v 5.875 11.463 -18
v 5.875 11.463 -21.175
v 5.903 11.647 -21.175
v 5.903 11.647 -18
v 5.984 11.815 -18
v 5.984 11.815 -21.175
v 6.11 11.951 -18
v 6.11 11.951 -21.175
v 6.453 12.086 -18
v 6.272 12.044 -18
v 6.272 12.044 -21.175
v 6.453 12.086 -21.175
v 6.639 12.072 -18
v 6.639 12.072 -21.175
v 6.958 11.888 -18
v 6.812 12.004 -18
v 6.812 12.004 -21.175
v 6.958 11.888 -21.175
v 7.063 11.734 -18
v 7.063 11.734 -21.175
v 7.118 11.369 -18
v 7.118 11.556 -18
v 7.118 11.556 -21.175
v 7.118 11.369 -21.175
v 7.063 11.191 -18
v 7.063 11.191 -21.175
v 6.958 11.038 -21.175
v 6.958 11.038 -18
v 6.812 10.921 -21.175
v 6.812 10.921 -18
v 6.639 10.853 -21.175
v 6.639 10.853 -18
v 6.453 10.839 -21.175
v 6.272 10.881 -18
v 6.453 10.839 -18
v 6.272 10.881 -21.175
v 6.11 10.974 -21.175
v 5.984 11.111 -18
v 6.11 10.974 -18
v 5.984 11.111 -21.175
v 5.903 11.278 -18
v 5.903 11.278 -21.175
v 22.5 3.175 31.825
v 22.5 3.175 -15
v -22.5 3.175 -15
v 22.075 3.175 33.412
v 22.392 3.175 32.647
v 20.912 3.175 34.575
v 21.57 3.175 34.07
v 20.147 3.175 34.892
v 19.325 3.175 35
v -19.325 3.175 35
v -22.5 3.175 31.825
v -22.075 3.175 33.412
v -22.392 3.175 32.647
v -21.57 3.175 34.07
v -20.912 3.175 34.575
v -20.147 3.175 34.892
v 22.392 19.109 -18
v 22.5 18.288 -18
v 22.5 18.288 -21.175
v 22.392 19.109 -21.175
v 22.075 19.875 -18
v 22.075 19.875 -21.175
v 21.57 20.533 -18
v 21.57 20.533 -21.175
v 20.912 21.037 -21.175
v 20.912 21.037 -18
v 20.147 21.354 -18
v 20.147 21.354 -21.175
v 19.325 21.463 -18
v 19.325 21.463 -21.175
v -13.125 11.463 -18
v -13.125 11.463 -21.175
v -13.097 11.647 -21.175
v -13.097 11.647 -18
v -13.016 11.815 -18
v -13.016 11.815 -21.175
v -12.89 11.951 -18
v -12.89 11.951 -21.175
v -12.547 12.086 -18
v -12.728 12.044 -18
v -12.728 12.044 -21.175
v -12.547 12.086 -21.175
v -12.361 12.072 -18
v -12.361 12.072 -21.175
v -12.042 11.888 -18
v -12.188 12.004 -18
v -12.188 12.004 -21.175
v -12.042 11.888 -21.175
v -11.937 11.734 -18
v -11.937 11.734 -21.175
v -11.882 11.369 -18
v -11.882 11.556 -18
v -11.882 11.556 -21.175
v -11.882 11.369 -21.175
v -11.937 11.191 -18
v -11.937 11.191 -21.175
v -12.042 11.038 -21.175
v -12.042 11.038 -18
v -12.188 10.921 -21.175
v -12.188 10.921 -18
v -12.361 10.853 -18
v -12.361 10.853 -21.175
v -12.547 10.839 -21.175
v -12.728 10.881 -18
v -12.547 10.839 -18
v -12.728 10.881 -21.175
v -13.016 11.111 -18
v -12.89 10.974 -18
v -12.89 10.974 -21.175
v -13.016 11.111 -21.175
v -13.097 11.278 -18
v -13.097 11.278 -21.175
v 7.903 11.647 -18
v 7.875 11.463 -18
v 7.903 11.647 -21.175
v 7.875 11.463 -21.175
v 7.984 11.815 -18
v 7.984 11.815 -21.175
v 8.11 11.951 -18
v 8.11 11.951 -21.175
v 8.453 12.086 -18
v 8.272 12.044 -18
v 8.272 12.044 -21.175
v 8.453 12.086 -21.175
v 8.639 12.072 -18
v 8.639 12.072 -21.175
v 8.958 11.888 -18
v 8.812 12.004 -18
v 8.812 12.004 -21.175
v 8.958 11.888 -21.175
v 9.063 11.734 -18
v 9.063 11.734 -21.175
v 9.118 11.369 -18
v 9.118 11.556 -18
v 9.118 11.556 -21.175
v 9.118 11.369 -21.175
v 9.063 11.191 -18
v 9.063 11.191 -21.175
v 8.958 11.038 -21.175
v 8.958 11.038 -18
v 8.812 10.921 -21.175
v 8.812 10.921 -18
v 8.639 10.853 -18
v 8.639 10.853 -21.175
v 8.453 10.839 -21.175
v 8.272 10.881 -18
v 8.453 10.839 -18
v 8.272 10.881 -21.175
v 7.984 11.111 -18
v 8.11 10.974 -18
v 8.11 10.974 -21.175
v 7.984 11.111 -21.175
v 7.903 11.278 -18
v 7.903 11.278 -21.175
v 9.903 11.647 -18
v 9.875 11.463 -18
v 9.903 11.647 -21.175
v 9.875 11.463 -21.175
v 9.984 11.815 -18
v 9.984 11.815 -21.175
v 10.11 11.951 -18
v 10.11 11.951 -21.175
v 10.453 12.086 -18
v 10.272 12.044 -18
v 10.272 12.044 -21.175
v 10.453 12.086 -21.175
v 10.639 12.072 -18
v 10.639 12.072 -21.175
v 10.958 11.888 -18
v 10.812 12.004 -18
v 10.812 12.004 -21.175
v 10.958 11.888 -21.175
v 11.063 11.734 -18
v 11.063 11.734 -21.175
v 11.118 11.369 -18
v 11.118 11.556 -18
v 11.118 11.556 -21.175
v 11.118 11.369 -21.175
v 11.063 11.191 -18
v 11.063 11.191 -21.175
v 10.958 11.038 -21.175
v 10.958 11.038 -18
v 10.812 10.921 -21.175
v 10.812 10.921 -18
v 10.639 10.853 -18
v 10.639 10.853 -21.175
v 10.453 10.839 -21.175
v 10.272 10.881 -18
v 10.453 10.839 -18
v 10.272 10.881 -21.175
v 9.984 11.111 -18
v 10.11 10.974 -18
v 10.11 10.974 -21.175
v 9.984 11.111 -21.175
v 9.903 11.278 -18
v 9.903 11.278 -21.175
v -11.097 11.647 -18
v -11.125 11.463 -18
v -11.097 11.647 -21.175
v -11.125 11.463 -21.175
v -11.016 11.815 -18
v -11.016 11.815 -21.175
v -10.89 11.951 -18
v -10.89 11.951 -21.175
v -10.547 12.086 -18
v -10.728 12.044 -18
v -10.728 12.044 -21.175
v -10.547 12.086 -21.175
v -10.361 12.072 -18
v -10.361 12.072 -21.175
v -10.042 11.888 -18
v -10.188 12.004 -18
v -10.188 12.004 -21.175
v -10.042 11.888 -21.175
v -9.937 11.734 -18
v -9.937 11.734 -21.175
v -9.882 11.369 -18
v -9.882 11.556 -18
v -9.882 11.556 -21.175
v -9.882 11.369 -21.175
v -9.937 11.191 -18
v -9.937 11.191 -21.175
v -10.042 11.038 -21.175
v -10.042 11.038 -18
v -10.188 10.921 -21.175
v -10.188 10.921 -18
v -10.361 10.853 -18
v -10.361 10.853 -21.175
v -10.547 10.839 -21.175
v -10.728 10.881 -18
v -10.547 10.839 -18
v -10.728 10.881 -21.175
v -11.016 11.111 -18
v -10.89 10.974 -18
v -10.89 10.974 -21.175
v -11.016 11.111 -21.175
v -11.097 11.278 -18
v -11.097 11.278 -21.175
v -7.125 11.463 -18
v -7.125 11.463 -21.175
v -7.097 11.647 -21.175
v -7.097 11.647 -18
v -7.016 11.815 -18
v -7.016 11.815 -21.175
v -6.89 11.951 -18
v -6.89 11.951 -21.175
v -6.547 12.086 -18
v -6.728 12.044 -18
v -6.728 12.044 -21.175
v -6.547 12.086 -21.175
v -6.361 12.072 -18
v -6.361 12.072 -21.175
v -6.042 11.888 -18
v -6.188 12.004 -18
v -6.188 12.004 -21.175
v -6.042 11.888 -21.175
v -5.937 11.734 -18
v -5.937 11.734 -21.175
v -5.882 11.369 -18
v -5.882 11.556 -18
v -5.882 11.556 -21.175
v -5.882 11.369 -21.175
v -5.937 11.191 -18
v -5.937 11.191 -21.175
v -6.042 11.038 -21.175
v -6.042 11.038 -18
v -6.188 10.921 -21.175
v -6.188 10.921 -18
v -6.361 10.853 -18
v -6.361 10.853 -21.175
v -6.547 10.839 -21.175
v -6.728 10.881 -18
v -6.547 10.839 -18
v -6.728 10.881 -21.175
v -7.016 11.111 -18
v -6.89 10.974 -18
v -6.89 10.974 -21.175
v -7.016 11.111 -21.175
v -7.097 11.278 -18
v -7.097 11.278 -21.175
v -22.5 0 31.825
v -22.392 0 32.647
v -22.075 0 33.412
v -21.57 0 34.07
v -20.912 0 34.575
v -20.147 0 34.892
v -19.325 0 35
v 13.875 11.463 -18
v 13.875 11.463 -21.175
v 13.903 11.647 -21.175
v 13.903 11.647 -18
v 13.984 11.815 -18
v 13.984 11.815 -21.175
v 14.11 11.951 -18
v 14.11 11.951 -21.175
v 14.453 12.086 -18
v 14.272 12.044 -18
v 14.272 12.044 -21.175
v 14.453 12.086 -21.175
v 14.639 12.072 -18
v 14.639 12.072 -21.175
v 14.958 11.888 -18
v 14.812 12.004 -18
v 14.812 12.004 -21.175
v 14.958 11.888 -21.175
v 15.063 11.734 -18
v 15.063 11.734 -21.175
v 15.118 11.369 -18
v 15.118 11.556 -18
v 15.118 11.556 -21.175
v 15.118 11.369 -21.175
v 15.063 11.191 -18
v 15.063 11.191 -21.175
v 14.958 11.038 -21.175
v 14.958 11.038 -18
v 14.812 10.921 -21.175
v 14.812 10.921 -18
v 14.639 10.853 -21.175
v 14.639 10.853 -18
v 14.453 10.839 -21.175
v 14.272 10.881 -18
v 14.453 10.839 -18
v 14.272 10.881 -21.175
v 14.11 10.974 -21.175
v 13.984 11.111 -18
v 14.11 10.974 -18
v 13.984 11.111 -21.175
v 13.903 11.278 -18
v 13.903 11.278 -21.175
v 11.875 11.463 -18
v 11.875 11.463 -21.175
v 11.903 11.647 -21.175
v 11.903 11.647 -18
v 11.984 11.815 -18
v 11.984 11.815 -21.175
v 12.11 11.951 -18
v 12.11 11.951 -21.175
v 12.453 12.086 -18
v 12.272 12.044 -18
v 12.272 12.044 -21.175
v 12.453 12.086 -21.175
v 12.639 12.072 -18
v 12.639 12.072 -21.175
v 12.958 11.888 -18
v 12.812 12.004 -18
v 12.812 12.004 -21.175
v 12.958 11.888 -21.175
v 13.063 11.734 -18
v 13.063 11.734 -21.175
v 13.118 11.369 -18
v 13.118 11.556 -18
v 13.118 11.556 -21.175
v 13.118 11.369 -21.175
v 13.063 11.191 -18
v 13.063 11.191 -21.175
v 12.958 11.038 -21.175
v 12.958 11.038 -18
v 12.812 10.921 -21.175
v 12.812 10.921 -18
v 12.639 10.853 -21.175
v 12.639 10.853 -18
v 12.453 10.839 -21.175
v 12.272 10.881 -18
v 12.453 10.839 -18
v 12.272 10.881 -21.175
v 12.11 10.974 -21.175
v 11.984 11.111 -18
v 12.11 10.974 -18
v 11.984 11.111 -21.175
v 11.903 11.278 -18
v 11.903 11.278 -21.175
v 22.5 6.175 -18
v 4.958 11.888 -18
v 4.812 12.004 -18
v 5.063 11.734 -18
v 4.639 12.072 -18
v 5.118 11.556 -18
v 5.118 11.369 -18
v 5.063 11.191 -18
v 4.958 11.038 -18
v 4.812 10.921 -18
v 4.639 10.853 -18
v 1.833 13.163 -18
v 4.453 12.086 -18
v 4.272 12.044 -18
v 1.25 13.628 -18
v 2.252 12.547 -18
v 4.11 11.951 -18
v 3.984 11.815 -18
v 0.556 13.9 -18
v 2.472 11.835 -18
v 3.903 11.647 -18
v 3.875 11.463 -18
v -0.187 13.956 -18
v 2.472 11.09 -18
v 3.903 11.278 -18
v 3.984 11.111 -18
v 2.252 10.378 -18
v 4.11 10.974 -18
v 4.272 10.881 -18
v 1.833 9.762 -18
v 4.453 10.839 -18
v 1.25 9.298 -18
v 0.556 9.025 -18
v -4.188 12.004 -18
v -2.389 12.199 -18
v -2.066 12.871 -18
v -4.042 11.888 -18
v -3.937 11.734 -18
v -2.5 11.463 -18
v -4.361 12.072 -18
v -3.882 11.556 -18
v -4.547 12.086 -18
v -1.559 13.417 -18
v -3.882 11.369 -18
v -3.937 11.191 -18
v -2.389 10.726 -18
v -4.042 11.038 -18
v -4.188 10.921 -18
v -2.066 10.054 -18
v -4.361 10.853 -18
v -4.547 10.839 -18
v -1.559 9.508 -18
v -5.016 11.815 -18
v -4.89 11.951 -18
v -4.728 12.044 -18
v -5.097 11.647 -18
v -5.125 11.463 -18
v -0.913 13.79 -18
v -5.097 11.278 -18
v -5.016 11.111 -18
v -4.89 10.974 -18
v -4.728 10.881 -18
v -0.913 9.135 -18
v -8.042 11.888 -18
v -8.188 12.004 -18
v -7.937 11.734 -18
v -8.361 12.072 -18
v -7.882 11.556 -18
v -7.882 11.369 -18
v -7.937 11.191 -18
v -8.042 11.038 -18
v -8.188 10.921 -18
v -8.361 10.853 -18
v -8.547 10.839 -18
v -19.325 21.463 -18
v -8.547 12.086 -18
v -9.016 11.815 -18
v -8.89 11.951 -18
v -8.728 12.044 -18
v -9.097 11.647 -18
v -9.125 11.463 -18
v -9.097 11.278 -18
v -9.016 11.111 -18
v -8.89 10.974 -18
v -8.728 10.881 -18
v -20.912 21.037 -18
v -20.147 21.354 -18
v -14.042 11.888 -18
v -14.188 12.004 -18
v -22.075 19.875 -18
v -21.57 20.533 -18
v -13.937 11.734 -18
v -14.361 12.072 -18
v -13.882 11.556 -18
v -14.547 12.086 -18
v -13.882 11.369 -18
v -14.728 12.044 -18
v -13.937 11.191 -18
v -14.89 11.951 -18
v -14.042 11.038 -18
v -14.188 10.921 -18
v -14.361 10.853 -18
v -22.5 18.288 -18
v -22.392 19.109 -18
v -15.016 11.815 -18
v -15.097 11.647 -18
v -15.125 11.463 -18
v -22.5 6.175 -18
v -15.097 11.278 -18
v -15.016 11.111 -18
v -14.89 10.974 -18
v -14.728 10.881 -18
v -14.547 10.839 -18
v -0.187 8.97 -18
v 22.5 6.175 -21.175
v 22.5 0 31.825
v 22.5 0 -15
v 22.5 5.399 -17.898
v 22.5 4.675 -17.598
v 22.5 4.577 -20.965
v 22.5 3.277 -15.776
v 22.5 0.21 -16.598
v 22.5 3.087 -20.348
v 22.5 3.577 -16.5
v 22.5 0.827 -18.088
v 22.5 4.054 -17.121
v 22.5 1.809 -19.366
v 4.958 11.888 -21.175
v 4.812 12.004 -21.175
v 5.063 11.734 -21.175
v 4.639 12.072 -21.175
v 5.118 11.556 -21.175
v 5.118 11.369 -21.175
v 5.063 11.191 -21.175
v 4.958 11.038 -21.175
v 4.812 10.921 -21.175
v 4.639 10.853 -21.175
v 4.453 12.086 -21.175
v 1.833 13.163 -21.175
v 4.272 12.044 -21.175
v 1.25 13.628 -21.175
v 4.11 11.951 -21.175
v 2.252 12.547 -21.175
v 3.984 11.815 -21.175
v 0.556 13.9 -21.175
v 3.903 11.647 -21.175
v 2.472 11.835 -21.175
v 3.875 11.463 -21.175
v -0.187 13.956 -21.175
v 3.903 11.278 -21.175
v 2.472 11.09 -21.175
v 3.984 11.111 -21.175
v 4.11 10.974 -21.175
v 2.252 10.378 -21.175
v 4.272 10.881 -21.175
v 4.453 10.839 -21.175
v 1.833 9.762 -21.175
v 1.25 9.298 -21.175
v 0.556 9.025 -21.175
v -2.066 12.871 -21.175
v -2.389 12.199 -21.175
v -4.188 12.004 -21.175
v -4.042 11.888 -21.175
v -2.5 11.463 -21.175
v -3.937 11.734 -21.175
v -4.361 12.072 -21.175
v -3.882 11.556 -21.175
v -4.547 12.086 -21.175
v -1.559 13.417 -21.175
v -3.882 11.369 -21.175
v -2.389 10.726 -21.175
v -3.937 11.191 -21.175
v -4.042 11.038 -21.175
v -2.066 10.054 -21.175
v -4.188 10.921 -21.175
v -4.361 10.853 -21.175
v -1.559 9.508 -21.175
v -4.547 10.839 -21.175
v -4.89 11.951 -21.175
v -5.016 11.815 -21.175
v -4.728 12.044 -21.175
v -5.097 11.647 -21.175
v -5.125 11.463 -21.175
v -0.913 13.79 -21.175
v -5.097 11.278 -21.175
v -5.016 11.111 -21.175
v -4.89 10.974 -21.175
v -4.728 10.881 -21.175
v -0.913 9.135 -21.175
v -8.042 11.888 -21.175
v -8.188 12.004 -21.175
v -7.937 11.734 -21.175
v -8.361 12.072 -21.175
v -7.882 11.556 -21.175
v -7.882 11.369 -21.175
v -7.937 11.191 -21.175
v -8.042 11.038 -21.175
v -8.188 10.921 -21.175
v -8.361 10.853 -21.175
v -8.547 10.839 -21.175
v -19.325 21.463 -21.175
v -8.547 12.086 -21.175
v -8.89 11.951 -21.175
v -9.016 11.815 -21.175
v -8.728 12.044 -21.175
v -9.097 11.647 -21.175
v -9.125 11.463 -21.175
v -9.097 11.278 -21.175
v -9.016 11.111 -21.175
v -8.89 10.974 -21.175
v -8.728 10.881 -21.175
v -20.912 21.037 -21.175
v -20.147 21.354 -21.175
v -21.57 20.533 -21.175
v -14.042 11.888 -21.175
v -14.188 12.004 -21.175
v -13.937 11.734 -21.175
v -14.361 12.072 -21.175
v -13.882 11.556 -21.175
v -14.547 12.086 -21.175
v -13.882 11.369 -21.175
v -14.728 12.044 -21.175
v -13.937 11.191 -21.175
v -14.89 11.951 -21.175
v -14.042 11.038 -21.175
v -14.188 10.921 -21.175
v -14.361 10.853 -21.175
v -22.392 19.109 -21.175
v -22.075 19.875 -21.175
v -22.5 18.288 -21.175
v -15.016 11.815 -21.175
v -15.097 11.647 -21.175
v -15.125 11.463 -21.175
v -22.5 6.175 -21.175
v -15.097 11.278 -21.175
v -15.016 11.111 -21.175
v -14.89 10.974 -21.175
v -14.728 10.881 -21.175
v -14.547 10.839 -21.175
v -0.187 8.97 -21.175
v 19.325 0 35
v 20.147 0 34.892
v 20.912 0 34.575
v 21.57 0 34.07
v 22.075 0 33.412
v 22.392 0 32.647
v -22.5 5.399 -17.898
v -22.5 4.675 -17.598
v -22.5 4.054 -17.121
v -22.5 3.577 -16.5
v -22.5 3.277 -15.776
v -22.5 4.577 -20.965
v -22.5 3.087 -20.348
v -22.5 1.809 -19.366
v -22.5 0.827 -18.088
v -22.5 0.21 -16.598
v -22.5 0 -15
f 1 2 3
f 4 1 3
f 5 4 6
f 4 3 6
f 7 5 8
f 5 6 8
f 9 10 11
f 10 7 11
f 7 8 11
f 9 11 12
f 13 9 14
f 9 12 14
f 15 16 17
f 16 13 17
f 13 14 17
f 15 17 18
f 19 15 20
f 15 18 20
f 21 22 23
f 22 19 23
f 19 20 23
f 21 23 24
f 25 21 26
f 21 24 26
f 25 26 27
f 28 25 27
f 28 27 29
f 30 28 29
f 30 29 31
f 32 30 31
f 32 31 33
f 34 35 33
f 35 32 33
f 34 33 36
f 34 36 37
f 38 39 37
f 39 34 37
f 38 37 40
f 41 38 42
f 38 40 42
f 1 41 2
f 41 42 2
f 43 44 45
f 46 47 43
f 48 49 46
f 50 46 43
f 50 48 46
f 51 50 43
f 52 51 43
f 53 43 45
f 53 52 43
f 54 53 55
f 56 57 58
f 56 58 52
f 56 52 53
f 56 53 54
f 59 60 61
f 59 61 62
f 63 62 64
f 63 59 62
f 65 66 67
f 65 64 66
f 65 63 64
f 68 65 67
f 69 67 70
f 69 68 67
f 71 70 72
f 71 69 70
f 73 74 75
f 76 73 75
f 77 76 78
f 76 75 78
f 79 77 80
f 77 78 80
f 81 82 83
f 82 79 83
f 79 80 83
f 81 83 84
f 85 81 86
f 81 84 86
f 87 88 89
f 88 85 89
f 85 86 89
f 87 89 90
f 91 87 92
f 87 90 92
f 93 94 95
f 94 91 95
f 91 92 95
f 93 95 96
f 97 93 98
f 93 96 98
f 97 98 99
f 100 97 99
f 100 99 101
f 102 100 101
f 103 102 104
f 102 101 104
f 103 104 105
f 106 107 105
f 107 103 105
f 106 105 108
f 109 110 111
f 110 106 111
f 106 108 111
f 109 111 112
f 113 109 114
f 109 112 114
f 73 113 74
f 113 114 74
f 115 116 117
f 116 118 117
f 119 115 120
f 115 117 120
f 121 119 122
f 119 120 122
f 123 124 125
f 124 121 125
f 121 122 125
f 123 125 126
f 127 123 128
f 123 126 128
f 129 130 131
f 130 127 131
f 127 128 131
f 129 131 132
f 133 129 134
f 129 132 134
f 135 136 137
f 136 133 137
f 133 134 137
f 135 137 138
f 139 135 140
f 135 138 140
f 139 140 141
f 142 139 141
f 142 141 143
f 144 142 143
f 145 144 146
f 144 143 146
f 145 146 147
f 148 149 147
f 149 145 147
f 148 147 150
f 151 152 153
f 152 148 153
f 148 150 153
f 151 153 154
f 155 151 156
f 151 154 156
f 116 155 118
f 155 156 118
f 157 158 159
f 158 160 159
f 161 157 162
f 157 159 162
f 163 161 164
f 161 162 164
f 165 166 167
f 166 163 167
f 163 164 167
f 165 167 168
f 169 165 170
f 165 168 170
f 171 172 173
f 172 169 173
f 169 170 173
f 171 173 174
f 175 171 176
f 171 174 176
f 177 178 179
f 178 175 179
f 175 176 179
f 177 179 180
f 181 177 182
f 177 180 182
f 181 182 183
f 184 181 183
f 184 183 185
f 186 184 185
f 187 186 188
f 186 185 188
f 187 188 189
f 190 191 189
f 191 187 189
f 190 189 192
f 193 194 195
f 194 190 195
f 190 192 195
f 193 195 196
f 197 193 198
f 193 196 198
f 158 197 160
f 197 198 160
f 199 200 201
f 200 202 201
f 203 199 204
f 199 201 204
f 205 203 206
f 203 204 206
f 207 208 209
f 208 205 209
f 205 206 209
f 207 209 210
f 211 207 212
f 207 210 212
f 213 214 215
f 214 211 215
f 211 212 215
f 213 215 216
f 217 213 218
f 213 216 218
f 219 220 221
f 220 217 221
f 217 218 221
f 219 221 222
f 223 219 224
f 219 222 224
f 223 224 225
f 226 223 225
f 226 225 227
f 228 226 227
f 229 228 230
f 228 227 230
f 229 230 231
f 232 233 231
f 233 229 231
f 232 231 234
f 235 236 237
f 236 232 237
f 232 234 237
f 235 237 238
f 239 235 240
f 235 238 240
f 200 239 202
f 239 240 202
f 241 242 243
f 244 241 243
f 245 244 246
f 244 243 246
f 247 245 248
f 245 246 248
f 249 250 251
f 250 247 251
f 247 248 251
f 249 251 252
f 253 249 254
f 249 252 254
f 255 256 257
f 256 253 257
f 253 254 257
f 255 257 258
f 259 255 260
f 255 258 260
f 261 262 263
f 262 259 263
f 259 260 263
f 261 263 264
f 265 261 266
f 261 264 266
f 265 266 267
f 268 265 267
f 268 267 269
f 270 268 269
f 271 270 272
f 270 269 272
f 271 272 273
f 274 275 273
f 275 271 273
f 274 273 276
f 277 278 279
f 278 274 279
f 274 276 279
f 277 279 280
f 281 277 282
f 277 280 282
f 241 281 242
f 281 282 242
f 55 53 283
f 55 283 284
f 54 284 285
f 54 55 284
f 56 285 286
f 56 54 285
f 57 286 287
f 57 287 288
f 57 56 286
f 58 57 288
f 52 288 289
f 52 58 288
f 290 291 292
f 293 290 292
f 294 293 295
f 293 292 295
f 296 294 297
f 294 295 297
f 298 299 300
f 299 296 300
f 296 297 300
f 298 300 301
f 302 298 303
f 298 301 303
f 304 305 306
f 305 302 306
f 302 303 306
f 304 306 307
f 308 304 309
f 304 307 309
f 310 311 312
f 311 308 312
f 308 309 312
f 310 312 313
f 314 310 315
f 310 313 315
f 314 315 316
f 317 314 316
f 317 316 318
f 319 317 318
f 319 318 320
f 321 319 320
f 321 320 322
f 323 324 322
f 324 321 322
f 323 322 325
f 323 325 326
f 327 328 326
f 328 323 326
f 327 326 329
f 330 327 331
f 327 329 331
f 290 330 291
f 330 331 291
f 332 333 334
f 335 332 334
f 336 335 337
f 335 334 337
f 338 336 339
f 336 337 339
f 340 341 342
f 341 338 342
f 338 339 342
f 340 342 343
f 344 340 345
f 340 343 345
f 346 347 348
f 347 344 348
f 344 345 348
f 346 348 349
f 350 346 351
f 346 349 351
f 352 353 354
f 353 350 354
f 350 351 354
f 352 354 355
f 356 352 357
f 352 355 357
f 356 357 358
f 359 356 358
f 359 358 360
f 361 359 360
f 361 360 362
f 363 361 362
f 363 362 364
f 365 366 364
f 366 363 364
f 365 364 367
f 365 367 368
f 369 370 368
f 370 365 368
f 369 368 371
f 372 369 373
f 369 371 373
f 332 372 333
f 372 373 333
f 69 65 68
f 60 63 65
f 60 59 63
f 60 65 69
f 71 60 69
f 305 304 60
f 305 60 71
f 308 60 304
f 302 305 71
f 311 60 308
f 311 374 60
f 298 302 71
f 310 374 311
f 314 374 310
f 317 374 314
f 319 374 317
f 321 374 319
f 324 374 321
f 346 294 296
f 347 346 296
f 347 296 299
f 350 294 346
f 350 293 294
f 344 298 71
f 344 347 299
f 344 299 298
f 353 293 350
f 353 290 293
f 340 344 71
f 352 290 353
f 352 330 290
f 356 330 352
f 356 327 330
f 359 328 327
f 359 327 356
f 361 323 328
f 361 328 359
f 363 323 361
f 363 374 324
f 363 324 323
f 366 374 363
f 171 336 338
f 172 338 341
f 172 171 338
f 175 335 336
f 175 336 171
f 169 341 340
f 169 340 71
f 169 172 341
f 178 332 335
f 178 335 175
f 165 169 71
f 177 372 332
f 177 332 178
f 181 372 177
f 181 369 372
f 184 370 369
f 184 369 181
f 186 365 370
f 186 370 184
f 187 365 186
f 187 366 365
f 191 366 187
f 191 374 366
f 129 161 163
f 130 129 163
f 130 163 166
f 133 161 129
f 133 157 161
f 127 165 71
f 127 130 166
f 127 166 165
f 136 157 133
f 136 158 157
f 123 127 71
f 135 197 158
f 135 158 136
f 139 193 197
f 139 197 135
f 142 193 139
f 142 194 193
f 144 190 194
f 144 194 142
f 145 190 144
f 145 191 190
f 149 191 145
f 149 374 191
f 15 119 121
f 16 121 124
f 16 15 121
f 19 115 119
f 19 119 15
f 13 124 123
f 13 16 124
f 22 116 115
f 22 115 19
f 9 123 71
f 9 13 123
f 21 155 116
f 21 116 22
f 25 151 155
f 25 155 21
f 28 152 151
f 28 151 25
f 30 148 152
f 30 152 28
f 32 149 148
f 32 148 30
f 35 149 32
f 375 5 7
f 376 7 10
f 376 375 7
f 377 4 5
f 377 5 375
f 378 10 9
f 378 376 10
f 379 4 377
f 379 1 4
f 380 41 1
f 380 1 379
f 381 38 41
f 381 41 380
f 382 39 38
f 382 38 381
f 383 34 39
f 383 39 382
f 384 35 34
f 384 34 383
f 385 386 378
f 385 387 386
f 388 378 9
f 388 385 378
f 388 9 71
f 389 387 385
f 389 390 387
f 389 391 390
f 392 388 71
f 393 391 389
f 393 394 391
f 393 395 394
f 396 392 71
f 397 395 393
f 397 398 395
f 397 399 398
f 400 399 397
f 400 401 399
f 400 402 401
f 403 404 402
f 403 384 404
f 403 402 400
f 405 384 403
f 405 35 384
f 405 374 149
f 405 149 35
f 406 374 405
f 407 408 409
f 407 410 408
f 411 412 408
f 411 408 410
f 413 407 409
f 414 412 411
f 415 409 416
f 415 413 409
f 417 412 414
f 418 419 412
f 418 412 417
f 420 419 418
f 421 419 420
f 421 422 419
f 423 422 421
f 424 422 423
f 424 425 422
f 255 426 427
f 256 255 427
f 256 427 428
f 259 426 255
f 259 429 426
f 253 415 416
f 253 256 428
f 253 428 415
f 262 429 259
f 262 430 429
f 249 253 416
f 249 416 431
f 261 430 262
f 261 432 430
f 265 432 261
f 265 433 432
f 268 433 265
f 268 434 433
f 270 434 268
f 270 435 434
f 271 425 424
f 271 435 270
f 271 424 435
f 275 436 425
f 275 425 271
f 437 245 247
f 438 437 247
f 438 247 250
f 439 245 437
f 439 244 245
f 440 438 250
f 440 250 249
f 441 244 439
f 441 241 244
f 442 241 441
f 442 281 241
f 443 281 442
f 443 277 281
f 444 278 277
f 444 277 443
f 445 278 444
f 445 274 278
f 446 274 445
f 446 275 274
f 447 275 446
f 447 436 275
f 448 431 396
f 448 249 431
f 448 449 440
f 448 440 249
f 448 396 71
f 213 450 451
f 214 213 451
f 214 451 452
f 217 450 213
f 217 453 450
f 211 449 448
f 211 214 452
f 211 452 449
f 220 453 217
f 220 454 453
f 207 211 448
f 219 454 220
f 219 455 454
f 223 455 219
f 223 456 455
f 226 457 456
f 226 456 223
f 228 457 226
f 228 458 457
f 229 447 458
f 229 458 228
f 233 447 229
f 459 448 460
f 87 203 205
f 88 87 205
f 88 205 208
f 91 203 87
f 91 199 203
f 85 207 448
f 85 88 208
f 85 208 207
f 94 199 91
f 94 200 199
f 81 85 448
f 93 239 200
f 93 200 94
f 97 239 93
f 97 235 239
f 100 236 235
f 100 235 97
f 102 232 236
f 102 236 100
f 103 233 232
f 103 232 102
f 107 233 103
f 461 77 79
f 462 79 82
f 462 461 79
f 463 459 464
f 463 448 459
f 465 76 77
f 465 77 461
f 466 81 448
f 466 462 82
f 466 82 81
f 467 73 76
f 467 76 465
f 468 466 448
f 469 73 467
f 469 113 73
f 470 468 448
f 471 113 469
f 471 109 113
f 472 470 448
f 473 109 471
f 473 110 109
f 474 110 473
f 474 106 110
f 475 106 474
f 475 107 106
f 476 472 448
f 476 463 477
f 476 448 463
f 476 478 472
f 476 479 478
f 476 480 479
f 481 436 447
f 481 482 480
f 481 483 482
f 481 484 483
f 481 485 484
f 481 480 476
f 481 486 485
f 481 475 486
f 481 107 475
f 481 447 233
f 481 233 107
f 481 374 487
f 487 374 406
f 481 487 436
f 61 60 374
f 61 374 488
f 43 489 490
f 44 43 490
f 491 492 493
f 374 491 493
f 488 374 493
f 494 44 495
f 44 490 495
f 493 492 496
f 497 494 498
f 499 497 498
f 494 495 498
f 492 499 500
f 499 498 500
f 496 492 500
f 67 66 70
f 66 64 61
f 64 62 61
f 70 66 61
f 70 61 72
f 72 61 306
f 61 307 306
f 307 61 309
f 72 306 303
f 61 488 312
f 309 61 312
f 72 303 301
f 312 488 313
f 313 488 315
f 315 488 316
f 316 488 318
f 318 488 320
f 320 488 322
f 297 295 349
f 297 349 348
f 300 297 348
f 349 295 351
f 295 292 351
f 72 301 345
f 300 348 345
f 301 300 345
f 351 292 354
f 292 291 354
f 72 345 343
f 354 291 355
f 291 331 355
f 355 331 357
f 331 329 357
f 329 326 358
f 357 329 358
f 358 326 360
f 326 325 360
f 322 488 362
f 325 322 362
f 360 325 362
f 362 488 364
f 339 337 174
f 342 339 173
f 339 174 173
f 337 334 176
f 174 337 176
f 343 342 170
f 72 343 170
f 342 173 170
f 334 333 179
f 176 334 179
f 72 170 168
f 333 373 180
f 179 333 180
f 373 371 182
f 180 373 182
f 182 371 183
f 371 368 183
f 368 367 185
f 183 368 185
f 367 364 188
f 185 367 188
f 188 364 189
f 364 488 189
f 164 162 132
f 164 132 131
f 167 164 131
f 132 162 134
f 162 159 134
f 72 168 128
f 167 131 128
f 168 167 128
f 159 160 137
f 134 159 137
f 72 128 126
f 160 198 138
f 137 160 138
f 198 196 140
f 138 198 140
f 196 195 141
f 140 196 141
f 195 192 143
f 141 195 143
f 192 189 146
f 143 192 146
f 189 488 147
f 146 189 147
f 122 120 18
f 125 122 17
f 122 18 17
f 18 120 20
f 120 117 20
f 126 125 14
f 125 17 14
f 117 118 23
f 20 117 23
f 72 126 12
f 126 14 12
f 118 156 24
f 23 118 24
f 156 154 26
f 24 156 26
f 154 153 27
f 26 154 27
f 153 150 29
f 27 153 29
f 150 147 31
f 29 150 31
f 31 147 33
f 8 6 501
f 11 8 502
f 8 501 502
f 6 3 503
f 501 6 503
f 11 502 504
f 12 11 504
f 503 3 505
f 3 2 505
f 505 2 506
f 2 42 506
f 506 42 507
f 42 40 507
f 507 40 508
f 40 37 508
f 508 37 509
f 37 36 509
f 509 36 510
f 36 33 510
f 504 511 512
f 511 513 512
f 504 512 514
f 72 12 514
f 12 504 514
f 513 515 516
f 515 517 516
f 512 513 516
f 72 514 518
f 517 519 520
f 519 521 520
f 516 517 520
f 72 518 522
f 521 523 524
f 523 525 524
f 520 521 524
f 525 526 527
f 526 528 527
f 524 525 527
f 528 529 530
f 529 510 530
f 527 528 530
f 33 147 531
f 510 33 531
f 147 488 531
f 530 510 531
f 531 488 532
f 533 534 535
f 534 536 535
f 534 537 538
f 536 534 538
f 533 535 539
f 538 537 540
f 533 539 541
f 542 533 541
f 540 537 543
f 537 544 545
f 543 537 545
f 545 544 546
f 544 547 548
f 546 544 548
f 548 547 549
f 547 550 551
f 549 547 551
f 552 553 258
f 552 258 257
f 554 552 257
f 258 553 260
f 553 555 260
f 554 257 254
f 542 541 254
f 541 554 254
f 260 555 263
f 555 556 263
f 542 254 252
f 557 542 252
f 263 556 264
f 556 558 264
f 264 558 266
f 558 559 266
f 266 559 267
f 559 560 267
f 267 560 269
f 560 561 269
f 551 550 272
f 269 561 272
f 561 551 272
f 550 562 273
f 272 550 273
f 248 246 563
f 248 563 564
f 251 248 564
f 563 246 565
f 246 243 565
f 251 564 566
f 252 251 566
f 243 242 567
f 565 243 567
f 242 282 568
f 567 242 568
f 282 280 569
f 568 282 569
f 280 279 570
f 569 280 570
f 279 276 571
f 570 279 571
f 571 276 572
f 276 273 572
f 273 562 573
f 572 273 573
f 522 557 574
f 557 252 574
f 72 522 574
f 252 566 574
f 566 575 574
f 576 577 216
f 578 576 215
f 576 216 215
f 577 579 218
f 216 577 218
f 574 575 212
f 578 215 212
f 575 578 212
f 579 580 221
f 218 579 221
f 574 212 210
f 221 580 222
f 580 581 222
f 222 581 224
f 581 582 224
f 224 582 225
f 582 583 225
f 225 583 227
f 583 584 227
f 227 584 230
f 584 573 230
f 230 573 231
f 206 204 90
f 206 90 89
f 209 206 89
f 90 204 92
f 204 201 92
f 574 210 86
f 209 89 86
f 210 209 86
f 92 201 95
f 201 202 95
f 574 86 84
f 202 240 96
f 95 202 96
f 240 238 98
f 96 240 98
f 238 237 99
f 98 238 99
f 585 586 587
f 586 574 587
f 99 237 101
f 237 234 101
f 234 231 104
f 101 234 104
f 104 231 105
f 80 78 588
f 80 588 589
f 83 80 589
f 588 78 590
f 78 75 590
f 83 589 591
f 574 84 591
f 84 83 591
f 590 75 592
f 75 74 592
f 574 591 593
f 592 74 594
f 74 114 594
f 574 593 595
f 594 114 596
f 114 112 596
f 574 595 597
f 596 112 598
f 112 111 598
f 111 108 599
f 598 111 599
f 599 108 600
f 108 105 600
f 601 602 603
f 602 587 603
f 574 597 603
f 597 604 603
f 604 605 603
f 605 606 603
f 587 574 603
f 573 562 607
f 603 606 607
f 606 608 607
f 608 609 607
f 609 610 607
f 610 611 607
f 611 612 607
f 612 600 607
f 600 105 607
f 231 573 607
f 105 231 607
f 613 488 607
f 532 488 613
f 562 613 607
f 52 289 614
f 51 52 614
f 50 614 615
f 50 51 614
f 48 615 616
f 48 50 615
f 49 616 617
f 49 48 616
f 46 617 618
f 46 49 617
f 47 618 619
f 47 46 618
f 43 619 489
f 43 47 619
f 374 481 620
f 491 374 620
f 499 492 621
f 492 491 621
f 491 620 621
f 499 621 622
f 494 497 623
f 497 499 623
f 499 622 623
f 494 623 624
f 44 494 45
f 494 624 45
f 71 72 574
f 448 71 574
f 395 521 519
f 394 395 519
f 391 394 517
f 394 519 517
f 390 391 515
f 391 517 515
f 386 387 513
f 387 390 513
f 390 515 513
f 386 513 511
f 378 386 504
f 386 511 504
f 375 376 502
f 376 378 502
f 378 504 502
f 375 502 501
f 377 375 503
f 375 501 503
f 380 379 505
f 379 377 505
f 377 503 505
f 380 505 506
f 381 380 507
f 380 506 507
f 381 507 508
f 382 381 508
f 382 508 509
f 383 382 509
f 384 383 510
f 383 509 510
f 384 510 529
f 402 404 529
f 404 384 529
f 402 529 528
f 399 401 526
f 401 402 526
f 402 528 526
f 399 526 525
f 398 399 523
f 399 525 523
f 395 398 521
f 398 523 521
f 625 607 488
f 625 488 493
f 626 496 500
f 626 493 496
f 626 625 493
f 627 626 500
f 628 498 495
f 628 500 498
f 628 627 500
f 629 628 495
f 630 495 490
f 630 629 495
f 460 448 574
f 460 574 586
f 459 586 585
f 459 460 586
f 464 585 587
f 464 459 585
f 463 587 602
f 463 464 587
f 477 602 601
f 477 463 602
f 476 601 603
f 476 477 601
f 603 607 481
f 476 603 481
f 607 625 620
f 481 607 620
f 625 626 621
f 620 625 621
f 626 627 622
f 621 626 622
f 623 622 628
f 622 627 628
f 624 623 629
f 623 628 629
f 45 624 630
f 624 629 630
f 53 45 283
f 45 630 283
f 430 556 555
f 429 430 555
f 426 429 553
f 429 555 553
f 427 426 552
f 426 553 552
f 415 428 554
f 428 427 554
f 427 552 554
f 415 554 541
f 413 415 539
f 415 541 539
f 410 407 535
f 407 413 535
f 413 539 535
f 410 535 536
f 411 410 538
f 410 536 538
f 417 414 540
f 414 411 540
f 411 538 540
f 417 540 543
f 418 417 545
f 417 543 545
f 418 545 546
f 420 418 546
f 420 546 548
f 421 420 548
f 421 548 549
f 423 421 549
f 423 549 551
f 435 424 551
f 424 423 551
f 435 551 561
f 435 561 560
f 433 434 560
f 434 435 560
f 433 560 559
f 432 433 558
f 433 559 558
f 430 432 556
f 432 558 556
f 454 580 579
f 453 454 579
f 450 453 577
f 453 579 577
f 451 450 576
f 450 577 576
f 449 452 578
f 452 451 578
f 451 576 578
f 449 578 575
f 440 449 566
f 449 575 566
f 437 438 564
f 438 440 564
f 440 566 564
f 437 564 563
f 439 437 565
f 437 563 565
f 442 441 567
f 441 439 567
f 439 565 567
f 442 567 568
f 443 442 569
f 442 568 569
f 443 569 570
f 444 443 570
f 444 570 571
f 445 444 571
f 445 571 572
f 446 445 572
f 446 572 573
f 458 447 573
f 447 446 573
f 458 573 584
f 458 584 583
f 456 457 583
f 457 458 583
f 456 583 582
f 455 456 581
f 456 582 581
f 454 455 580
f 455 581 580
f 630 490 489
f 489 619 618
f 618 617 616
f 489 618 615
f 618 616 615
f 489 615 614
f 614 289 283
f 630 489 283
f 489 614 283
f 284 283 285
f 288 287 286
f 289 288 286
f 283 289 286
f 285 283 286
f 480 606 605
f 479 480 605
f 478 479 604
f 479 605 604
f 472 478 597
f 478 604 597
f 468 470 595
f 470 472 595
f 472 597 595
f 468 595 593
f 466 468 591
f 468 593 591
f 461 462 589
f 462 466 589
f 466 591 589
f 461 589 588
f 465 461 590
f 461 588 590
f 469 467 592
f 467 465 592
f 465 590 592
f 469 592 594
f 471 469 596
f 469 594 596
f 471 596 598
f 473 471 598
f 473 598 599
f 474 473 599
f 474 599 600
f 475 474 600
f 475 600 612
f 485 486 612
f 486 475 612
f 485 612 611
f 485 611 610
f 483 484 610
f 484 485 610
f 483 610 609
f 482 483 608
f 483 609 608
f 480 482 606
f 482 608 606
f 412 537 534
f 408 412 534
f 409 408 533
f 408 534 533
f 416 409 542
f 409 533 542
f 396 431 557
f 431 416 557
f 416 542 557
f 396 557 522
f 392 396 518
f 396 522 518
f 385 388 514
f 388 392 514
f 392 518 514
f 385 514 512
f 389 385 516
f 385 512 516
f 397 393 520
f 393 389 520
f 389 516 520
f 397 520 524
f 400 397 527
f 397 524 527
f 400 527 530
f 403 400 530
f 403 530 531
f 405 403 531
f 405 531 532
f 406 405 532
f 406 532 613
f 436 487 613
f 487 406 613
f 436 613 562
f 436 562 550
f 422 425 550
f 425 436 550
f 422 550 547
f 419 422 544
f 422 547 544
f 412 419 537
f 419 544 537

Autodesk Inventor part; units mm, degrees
ref_plane "YZ Plane" through (0, 0, 0) normal (1, 0, 0) x (0, 1, 0)
ref_plane "XZ Plane" through (0, 0, 0) normal (0, 1, 0) x (-1, 0, 0)
ref_plane "XY Plane" through (0, 0, 0) normal (0, 0, 1) x (1, 0, 0)
sketch "Sketch1" plane through (0, 0, 0) normal (0, 1, 0) x (-1, 0, 0)
  line L0 (22.5, 35) -> (-22.5, 35)
  line L1 (-22.5, 35) -> (-22.5, -35)
  line L2 (-22.5, -35) -> (22.5, -35)
  line L3 (22.5, -35) -> (22.5, 35)
  line L4 (22.5, 35) -> (-22.5, -35) construction
  line L5 (-22.5, 35) -> (22.5, -35) construction
  line L6 (0, 0) -> (0, -35) construction
  circle A0 centre (0, -25) radius 2.5
  circle A1 centre (0, -25) radius 4.5 construction
  line L7 (0, -25) -> (-4.5, -25) construction
  circle A2 centre (-4.5, -25) radius 0.625
  circle A3 centre (-6.5, -25) radius 0.625
  circle A4 centre (-8.5, -25) radius 0.625
  circle A5 centre (-10.5, -25) radius 0.625
  circle A6 centre (-12.5, -25) radius 0.625
  circle A7 centre (-14.5, -25) radius 0.625
  circle A8 centre (4.5, -25) radius 0.625
  circle A9 centre (6.5, -25) radius 0.625
  circle A10 centre (8.5, -25) radius 0.625
  circle A11 centre (10.5, -25) radius 0.625
  circle A12 centre (12.5, -25) radius 0.625
  circle A13 centre (14.5, -25) radius 0.625
  dimension "d3" = 9
  dimension "d0" = 45
  dimension "d1" = 70
  dimension "d2" = 5
  dimension "d4" = 1.25
  dimension "d7" = 2
  dimension "d14" = 360
  dimension "d16" = 10
extrude "Extrusion1" add sketch "Sketch1" along normal blind 3.175
fillet "Fillet1" radius 3.175 4 edges at (22.5, 1.5875, -35) (-22.5, 1.5875, -35) (-22.5, 1.5875, 35) (22.5, 1.5875, 35)
sketch "Sketch2" plane through (0, 3.175, 0) normal (0, 1, 0) x (1, 0, 0)
  line L0 (-22.5, 31.825) -> (-22.5, -31.825) projected
  line L1 (-22.5, 15) -> (22.5, 15)
  line L2 (22.5, -31.825) -> (22.5, 31.825) projected
  line L3 (19.325, 35) -> (-19.325, 35) projected
  point P0 (0, 0)
  dimension "d20" = 20
bend part "Bend Part1" radius 3 angle 90 line through (-22.5, 3.175, -15) along (1, 0, 0) centre toward (0, 1, 0) moving side (0, 0, -1) both sides no
properties part number "Platform"
